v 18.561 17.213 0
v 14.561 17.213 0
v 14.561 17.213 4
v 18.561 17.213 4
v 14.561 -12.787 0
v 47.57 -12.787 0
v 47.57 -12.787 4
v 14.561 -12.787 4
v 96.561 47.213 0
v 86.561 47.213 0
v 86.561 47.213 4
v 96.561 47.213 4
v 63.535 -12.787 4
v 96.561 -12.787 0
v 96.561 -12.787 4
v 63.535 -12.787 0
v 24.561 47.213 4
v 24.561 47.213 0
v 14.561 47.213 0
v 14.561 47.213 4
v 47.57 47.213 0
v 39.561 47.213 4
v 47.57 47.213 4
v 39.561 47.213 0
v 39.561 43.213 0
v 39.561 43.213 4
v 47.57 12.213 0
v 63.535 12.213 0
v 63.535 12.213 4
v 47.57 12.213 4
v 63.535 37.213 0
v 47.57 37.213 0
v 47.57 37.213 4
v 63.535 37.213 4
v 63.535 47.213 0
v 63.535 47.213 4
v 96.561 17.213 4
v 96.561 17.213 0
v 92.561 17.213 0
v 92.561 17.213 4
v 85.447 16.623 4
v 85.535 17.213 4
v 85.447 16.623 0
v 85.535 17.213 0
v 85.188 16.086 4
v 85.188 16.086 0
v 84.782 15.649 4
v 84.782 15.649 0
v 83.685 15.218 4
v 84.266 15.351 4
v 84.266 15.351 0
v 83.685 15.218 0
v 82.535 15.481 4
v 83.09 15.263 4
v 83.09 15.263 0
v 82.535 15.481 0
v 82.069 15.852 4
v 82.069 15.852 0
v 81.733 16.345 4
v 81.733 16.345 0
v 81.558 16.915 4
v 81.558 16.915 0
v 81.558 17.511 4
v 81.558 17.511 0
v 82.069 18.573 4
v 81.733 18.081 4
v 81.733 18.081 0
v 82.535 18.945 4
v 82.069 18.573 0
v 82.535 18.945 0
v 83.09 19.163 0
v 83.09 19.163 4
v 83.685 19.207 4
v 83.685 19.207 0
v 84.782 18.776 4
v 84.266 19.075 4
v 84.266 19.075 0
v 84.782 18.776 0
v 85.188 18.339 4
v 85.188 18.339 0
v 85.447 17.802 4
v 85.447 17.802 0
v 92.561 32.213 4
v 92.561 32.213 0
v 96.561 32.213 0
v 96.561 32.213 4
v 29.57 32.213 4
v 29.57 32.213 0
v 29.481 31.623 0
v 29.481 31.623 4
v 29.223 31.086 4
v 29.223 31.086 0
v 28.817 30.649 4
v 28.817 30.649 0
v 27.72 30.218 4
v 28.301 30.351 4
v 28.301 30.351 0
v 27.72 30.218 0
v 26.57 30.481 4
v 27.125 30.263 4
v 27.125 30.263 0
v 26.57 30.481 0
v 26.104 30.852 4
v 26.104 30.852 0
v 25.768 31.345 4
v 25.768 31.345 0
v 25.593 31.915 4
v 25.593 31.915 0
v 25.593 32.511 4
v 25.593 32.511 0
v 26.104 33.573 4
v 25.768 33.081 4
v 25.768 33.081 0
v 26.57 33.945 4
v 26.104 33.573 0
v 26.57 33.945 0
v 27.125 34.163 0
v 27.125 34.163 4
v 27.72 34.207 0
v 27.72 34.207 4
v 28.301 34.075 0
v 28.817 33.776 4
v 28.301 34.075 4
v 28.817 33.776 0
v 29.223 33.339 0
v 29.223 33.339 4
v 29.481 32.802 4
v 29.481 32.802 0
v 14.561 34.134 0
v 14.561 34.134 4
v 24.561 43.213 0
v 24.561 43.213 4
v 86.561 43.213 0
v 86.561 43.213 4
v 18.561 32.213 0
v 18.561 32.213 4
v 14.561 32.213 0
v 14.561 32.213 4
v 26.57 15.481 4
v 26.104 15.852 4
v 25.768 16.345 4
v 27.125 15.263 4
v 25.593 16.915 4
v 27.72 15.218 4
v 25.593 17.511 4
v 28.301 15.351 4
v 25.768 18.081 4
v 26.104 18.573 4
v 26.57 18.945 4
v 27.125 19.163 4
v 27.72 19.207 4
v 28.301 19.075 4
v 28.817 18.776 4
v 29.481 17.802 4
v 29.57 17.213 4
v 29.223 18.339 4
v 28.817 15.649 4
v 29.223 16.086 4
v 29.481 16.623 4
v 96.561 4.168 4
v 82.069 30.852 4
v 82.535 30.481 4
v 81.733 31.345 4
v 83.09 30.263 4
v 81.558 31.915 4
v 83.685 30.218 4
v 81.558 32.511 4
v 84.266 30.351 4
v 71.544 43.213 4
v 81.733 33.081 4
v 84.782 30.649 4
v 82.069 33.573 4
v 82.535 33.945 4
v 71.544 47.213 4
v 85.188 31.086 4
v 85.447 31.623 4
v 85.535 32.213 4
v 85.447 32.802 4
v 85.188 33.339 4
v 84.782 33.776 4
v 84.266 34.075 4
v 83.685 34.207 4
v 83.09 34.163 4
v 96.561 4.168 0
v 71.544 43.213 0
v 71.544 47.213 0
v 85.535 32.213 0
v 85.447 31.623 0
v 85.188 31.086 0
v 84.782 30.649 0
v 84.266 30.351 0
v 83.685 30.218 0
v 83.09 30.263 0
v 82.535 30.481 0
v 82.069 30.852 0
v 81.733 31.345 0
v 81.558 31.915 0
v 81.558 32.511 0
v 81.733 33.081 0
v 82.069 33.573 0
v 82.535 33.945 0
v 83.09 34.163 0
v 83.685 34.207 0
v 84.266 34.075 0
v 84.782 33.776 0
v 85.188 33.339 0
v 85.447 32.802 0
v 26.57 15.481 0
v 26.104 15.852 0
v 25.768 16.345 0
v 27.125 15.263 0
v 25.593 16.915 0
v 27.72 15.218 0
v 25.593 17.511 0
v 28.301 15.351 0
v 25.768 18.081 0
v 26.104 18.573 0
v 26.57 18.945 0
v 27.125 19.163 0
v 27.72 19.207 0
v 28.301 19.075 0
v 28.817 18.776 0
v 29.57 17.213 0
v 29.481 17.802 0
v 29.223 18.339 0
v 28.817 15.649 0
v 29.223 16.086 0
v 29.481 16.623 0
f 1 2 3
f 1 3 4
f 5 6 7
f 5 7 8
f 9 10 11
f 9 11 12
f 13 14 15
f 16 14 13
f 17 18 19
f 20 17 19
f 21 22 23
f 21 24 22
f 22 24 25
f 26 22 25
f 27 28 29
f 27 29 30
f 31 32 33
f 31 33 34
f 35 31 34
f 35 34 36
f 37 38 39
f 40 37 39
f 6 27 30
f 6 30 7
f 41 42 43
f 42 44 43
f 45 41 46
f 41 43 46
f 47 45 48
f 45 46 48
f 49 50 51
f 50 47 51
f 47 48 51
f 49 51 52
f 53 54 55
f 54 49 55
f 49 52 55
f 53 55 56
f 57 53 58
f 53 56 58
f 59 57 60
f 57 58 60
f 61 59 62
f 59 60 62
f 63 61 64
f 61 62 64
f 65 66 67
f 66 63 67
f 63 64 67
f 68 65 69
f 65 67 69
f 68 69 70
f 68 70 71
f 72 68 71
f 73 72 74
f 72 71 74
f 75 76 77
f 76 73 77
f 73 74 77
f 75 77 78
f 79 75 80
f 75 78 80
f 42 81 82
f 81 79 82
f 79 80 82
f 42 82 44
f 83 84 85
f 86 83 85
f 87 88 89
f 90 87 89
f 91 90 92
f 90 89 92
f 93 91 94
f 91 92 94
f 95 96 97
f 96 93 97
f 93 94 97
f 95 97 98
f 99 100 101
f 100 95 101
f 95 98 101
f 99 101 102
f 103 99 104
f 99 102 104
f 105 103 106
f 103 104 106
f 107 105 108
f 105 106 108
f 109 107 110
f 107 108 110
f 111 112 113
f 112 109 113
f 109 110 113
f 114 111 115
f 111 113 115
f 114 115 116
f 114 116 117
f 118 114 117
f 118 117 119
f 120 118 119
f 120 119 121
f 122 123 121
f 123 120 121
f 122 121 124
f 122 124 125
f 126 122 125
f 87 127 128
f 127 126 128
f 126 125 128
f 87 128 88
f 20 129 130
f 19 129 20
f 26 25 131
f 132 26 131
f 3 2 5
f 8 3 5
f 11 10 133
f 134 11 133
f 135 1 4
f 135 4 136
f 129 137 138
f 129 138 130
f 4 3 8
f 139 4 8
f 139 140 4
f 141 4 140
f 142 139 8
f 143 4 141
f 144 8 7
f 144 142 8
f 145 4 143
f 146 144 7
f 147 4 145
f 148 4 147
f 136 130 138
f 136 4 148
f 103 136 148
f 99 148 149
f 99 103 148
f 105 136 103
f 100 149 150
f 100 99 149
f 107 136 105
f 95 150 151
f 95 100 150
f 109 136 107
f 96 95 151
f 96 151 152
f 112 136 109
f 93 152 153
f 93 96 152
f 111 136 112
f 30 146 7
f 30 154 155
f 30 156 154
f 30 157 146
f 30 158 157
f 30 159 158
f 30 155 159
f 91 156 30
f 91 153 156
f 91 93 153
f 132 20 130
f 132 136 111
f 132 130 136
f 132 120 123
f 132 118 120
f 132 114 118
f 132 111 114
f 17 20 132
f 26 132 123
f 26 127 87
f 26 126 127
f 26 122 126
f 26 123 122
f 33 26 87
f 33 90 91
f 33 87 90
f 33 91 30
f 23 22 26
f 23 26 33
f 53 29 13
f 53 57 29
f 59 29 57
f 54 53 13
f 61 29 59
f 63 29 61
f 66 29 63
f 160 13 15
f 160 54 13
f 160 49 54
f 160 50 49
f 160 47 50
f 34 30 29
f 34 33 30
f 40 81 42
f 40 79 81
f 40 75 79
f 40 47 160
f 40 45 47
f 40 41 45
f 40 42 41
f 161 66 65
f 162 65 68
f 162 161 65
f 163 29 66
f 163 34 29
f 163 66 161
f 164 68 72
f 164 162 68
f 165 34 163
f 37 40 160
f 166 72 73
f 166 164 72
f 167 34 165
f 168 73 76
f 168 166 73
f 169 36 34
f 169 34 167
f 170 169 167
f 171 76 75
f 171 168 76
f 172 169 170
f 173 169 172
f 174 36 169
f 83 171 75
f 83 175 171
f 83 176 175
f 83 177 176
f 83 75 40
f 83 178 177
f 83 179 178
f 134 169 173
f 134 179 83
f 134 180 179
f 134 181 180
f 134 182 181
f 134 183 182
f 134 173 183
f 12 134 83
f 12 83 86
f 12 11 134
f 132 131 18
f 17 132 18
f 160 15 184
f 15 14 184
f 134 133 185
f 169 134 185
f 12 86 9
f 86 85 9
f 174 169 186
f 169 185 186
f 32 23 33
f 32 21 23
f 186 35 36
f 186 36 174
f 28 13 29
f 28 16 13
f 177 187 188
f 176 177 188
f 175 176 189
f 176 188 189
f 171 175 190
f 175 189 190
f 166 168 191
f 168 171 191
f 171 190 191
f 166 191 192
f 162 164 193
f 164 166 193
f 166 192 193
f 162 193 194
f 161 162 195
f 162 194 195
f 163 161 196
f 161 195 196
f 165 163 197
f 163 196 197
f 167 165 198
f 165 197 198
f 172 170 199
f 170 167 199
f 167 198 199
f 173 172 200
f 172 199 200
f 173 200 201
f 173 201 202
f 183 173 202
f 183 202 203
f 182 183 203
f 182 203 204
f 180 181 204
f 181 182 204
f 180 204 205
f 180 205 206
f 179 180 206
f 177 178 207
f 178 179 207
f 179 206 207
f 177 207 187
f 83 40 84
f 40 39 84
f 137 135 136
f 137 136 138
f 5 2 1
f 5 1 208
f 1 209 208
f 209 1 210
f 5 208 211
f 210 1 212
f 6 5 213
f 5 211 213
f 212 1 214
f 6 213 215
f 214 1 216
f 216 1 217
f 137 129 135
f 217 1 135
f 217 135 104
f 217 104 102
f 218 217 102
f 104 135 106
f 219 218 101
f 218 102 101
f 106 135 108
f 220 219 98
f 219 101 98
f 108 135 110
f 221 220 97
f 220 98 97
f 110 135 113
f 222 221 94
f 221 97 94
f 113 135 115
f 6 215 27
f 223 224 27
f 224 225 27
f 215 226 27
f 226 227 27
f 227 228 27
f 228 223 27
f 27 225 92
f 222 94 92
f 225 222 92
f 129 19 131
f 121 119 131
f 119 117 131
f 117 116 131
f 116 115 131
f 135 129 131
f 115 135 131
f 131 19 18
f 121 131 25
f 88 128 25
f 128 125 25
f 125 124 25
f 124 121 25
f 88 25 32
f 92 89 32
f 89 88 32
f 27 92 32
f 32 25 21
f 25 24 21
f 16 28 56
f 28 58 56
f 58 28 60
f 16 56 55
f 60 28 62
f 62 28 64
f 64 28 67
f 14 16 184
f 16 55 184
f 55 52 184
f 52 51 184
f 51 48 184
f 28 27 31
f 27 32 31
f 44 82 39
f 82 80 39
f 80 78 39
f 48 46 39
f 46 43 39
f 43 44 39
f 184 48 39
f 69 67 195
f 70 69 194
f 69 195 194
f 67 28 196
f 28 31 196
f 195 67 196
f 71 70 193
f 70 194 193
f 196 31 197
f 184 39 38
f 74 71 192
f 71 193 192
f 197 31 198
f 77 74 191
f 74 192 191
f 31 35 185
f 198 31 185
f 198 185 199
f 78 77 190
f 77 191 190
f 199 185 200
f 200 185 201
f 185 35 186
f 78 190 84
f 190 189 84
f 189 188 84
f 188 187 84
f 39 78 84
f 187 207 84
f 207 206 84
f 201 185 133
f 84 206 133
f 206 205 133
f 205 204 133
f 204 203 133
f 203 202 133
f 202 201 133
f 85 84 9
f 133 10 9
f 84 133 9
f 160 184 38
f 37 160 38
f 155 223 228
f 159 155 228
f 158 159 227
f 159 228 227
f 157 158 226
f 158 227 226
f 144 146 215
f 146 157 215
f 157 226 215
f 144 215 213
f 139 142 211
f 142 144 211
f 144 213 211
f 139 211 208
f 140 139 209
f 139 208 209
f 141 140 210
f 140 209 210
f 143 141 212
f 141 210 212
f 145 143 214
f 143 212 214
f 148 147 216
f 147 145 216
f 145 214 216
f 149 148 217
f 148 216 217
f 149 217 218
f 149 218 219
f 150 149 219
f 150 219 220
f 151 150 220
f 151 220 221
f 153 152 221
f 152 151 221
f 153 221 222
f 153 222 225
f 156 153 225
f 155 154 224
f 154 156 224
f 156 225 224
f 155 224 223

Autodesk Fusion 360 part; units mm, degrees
sketch "Sketch1" plane through (0, 0, 0) normal (0, 0, 1) x (1, 0, 0)
  circle A0 centre (27.5702, 32.2128) radius 2
  circle A1 centre (27.5702, 17.2128) radius 2
  circle A2 centre (83.5354, 17.2128) radius 2
  circle A3 centre (83.5354, 32.2128) radius 2
  line L0 (14.5612, 17.2128) -> (18.5612, 17.2128)
  line L1 (18.5612, 17.2128) -> (18.5612, 32.2128)
  line L2 (18.5612, 32.2128) -> (14.5612, 32.2128)
  line L3 (96.5612, 17.2128) -> (92.5612, 17.2128)
  line L4 (92.5612, 17.2128) -> (92.5612, 32.2128)
  line L5 (92.5612, 32.2128) -> (96.5612, 32.2128)
  line L6 (14.5612, 32.2128) -> (14.5612, 34.134)
  line L7 (14.5612, 34.134) -> (14.5612, 47.2128)
  line L8 (14.5612, 17.2128) -> (14.5612, -12.7872)
  line L9 (96.5612, -12.7872) -> (96.5612, 4.1678)
  line L10 (96.5612, 4.1678) -> (96.5612, 17.2128)
  line L11 (96.5612, 32.2128) -> (96.5612, 47.2128)
  line L12 (47.5702, 37.2128) -> (63.5354, 37.2128)
  line L13 (63.5354, 37.2128) -> (63.5354, 47.2128)
  line L14 (47.5702, 47.2128) -> (47.5702, 37.2128)
  line L15 (63.5354, 12.2128) -> (47.5702, 12.2128)
  line L16 (47.5702, 12.2128) -> (47.5702, -12.7872)
  line L17 (63.5354, -12.7872) -> (63.5354, 12.2128)
  line L18 (96.5612, -12.7872) -> (63.5354, -12.7872)
  line L19 (47.5702, -12.7872) -> (14.5612, -12.7872)
  line L20 (39.5612, 47.2128) -> (39.5612, 43.2128)
  line L21 (39.5612, 43.2128) -> (24.5612, 43.2128)
  line L22 (24.5612, 43.2128) -> (24.5612, 47.2128)
  line L23 (86.5612, 47.2128) -> (86.5612, 43.2128)
  line L24 (86.5612, 43.2128) -> (71.5444, 43.2128)
  line L25 (71.5444, 43.2128) -> (71.5444, 47.2128)
  line L26 (24.5612, 47.2128) -> (14.5612, 47.2128)
  line L27 (39.5612, 47.2128) -> (47.5702, 47.2128)
  line L28 (63.5354, 47.2128) -> (71.5444, 47.2128)
  line L29 (86.5612, 47.2128) -> (96.5612, 47.2128)
  dimension "d45" = 30
  dimension "d46" = 30
extrude "Extrude9" add sketch "Sketch1" along normal blind 4
